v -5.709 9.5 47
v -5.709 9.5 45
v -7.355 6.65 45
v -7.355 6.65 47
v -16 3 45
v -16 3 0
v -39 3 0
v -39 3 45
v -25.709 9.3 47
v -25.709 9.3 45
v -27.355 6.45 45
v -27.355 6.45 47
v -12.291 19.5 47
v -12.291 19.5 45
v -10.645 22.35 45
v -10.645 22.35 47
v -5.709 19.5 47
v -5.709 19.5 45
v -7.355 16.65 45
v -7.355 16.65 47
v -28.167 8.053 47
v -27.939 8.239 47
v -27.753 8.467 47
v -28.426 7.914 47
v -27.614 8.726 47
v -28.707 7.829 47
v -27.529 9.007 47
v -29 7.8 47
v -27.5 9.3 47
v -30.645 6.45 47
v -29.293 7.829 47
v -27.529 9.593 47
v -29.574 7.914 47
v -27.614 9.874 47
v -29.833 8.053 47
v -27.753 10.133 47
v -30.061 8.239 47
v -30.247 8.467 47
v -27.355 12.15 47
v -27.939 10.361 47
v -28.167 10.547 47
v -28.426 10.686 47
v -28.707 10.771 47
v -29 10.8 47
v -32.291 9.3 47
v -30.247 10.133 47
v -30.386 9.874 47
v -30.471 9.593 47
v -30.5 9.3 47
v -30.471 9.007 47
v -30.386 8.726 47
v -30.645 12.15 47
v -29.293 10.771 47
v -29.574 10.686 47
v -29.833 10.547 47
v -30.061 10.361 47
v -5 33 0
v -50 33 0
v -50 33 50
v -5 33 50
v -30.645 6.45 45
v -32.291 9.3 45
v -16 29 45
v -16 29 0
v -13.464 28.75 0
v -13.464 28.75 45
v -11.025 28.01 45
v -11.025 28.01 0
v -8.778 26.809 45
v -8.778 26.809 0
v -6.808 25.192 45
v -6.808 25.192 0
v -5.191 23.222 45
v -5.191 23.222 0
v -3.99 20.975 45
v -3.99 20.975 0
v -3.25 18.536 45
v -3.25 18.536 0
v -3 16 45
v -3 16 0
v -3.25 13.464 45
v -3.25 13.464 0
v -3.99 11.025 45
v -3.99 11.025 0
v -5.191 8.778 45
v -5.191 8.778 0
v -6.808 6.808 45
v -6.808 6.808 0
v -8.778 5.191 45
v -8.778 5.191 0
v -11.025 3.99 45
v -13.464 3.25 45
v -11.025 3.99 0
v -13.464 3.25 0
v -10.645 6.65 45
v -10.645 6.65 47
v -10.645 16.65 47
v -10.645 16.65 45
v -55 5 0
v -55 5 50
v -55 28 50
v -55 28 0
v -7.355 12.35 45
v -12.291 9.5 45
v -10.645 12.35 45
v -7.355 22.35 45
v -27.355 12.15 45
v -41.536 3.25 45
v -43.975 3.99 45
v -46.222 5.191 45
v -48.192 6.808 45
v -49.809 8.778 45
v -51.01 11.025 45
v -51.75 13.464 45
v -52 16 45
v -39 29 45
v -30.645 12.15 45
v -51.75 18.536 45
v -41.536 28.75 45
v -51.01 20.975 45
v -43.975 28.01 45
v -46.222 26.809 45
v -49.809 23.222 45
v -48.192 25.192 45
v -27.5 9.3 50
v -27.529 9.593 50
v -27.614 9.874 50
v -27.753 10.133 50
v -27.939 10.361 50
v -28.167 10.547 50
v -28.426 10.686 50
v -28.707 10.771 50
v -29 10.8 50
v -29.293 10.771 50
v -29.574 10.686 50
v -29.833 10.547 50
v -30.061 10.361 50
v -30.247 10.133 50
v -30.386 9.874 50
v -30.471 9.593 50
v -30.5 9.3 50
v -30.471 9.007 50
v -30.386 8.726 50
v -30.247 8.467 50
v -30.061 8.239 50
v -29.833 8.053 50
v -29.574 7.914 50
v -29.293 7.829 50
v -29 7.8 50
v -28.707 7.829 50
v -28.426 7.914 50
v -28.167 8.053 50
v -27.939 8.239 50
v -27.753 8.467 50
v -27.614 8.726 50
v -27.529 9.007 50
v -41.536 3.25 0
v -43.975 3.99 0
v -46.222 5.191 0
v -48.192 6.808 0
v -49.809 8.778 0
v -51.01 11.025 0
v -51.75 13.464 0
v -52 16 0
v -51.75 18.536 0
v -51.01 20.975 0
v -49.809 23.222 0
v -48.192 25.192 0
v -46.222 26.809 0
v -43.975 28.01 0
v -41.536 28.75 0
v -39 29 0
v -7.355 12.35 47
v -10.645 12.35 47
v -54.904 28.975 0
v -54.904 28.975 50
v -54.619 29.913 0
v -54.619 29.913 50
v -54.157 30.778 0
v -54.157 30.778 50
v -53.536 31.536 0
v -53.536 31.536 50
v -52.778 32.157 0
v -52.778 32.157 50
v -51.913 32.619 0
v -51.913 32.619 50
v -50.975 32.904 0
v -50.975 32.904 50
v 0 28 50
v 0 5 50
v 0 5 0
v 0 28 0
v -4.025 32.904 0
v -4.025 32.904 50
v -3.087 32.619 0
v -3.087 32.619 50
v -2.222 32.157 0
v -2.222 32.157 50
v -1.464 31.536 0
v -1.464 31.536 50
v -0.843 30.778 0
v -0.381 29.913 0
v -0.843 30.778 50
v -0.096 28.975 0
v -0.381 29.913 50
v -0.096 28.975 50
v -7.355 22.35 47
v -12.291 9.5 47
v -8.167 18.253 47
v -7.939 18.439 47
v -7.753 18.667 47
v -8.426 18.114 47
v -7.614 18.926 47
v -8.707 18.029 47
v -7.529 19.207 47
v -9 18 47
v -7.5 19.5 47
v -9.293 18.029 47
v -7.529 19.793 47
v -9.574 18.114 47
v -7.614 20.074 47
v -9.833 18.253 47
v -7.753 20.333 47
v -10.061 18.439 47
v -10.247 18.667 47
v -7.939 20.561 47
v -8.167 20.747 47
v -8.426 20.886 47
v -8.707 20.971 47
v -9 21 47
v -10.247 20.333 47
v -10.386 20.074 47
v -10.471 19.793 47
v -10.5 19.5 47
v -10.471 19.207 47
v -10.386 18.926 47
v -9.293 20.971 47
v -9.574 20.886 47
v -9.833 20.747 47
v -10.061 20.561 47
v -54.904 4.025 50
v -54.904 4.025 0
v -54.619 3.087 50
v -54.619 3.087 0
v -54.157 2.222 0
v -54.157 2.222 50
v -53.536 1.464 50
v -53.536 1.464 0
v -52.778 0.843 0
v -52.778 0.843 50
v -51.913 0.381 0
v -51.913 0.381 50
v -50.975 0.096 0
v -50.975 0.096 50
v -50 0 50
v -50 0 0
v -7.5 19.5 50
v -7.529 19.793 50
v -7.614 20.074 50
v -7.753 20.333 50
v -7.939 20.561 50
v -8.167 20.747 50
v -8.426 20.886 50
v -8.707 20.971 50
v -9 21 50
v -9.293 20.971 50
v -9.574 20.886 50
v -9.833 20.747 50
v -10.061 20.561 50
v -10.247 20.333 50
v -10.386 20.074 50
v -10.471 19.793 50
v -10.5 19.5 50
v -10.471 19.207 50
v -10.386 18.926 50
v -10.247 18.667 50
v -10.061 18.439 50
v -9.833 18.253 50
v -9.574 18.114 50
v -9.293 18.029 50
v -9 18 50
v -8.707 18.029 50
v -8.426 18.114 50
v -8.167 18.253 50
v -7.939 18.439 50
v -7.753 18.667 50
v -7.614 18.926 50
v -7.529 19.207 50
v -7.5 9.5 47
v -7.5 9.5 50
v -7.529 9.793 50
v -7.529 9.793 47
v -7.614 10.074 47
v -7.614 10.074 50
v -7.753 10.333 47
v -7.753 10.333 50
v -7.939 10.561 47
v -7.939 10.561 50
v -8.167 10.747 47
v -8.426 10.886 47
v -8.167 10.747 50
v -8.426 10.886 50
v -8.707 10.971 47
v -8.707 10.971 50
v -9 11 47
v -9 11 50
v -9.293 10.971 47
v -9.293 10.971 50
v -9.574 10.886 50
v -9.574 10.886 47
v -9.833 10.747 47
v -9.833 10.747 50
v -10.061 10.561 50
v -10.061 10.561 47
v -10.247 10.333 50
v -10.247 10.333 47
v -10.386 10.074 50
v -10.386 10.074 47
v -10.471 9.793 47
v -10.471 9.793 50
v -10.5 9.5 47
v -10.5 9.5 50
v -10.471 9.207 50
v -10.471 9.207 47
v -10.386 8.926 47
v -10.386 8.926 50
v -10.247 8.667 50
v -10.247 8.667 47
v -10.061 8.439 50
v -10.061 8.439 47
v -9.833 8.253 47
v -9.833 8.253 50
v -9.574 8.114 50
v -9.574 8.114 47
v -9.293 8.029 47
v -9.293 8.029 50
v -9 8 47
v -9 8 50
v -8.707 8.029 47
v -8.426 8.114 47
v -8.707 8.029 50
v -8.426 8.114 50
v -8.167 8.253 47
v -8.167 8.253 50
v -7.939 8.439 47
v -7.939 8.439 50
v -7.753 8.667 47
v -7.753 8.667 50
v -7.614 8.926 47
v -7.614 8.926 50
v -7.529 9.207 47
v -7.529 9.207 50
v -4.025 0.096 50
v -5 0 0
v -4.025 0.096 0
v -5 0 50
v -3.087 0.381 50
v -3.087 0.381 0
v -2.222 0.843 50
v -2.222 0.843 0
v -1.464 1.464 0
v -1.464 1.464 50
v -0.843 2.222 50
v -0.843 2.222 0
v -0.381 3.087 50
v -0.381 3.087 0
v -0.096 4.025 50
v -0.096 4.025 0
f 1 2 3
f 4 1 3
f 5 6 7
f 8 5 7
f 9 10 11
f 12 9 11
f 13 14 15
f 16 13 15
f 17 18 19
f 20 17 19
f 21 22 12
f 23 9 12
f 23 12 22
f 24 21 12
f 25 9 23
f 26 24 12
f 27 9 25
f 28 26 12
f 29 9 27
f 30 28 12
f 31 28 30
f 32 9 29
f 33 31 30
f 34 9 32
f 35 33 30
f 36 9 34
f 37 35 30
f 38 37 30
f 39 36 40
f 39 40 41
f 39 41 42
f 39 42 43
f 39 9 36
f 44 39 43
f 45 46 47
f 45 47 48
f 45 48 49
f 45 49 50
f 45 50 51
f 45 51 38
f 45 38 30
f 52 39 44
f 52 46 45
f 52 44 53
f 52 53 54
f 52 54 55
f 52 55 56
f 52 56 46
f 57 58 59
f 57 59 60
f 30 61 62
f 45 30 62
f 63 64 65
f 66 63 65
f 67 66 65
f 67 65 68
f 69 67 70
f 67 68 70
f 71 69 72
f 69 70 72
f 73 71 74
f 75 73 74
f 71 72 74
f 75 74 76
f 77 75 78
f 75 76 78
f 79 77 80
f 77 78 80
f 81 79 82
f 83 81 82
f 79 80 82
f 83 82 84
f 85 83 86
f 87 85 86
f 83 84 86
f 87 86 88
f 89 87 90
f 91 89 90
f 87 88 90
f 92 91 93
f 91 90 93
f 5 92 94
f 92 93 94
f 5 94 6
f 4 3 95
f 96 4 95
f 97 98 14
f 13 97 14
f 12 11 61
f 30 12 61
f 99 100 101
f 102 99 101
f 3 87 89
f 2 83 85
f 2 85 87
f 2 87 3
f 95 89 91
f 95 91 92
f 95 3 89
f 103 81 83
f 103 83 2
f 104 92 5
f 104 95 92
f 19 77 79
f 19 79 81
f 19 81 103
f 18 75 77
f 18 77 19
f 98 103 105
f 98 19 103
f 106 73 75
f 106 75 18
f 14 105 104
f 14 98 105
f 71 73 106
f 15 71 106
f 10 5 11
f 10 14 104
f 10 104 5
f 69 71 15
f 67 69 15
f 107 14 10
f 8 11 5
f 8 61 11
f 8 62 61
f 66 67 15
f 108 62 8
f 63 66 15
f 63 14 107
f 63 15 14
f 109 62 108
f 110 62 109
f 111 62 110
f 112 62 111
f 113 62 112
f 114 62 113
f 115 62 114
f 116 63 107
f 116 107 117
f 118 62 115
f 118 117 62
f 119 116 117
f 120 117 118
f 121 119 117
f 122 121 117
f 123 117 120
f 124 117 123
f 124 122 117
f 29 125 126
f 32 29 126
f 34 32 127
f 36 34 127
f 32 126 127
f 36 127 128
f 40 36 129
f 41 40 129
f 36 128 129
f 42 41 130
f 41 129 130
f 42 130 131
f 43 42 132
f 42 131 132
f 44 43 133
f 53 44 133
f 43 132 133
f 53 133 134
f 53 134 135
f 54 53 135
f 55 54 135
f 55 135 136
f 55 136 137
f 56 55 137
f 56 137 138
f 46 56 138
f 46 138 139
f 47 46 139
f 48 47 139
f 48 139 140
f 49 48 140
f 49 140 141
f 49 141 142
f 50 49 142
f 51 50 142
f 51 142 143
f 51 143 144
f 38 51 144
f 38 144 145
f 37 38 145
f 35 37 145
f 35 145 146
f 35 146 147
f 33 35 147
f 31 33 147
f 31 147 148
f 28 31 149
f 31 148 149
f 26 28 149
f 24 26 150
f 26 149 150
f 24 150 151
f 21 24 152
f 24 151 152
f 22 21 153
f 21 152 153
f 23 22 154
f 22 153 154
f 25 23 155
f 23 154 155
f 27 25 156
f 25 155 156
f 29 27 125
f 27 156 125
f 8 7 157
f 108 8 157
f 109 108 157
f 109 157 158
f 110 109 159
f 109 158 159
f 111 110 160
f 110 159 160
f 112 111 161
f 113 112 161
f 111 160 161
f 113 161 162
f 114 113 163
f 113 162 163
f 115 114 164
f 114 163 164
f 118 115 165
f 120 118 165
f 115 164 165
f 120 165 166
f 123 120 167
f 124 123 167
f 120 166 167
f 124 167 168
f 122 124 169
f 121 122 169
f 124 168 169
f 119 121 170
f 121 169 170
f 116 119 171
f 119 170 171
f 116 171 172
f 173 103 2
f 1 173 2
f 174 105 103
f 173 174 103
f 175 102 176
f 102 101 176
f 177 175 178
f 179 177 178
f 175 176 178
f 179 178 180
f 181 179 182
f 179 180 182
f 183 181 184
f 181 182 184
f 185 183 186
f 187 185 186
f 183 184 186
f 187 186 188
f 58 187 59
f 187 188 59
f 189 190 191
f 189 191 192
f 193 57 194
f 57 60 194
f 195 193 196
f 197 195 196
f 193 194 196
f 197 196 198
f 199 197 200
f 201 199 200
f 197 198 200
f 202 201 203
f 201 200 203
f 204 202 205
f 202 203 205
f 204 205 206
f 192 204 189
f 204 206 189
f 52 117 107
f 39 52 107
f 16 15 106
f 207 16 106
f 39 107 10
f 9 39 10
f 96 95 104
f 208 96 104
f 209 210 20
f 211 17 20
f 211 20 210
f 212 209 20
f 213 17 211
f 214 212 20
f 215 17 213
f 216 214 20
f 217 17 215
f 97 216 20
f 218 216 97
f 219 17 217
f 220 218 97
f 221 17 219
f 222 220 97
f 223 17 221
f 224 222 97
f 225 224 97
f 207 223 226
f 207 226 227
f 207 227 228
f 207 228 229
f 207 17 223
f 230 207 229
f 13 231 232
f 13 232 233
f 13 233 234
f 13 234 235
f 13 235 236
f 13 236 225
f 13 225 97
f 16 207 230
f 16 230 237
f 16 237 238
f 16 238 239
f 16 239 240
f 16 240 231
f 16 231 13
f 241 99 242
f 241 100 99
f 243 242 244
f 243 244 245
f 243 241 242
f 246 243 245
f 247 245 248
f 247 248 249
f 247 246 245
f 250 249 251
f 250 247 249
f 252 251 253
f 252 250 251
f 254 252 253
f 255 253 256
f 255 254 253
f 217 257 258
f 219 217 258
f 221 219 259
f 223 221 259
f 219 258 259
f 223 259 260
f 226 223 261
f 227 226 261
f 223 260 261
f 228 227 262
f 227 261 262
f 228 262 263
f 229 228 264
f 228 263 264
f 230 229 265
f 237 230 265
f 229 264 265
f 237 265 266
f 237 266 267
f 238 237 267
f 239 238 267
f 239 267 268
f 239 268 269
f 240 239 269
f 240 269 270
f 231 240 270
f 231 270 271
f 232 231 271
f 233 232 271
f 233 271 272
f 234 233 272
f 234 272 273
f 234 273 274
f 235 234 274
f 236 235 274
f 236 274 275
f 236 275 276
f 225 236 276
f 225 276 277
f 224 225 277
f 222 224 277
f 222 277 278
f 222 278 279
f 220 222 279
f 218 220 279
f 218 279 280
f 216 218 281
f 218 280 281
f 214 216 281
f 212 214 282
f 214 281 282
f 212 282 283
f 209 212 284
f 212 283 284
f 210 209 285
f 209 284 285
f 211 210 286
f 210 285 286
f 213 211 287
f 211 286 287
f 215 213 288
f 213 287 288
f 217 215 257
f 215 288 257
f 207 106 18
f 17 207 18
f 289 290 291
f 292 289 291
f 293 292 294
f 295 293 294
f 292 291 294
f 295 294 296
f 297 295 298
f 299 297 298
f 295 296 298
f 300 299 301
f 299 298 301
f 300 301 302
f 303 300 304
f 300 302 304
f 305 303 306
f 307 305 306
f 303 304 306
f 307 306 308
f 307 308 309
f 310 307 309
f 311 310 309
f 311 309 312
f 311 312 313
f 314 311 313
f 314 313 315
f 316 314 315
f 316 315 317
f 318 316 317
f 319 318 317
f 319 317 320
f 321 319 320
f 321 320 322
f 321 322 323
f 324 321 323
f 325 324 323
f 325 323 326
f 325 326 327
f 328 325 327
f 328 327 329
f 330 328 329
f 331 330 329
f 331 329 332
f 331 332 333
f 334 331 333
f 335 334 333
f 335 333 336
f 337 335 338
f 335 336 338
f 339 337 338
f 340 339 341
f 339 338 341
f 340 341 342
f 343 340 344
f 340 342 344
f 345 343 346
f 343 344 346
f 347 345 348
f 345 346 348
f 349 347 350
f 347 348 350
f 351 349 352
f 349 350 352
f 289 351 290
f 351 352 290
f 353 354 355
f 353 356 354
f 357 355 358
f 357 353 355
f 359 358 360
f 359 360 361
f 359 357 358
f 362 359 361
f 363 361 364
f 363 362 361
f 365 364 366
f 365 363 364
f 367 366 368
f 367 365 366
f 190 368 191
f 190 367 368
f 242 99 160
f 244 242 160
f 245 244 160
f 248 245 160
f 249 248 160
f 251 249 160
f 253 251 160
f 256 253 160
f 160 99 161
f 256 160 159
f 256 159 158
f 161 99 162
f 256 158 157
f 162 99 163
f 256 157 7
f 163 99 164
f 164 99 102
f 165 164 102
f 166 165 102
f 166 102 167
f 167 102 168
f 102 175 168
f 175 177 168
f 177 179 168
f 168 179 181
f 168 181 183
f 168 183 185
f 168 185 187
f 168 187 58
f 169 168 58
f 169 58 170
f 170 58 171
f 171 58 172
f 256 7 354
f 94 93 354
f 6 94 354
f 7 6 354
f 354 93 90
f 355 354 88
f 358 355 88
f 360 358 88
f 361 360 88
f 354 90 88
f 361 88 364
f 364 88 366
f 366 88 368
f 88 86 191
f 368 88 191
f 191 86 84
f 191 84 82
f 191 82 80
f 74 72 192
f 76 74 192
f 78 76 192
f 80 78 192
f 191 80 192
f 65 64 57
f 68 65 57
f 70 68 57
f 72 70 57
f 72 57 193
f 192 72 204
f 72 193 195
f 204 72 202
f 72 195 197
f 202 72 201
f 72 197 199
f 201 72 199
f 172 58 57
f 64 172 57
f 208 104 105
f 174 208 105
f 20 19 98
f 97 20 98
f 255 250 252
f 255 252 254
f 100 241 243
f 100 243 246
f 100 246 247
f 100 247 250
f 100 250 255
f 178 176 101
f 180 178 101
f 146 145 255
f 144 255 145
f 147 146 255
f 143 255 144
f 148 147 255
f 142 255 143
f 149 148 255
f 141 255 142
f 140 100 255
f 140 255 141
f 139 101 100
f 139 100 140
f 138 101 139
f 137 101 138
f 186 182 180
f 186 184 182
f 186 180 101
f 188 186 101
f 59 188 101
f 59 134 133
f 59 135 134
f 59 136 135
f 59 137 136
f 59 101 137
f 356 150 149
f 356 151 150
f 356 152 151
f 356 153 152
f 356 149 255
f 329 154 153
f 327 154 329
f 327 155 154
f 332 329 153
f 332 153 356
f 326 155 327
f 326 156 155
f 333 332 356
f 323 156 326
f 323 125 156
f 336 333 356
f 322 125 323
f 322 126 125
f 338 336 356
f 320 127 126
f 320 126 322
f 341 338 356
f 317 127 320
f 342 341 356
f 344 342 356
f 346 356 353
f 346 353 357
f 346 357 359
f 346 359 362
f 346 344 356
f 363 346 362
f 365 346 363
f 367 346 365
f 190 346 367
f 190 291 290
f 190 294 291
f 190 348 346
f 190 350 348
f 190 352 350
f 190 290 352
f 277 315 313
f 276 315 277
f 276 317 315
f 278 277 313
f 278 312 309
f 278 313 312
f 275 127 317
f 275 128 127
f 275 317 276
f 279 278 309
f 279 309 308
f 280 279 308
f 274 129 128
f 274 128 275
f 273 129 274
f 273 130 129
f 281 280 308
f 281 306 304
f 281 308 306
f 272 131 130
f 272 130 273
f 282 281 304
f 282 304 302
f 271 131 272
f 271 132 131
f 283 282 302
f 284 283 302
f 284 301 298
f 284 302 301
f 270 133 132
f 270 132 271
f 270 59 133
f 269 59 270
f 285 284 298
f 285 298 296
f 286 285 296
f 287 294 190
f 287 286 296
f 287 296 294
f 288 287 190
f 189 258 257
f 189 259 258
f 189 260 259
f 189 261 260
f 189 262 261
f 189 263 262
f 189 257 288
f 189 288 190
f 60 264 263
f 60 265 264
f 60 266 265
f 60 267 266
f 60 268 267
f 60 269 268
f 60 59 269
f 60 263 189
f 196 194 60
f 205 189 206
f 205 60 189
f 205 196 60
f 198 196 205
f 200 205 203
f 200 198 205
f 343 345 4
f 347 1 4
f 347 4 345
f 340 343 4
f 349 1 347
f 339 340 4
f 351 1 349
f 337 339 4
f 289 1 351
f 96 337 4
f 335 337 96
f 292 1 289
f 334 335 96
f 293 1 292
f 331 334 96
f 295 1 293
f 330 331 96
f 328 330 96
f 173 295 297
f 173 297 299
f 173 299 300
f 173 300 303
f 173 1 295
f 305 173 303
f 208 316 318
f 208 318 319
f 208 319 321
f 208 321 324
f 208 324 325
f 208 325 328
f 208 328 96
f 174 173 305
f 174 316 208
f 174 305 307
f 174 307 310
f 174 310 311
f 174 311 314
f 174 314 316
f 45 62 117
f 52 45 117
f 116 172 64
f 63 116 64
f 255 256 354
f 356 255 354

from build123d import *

# Parameters (mm, degrees)
ESQUISSE1_W             = 55
ESQUISSE1_H             = 33
BOSS_EXTRU_1_DEPTH      = 50
ENL_V_MAT_EXTRU_2_DEPTH = 45
CONG_1_R                = 5
ESQUISSE3_R             = 1.5
ENL_V_MAT_EXTRU_3_DEPTH = 10
ENL_V_MAT_EXTRU_4_DEPTH = 2


with BuildPart() as part:
    # Esquisse1 → Boss.-Extru.1 (new body)
    with BuildSketch(Plane.XY):
        with Locations((-27.5, 16.5)):
            Rectangle(ESQUISSE1_W, ESQUISSE1_H)
    extrude(amount=BOSS_EXTRU_1_DEPTH)

    # Esquisse2 → Enlèv. mat.-Extru.2 (cut)
    with BuildSketch(Plane.XY):
        with BuildLine():
            Line((-39, 29), (-16, 29))
            ThreePointArc((-16, 29), (-3, 16), (-16, 3))
            Line((-16, 3), (-39, 3))
            ThreePointArc((-39, 3), (-52, 16), (-39, 29))
        make_face()
    extrude(amount=ENL_V_MAT_EXTRU_2_DEPTH, mode=Mode.SUBTRACT)

    # Congé1
    cong_1_edges = [part.edges().sort_by_distance(p)[0] for p in [
        (0, 0, 25),
        (-55, 0, 25),
        (-55, 33, 25),
        (0, 33, 25),
    ]]
    fillet(cong_1_edges, radius=CONG_1_R)

    # Esquisse3 → Enlèv. mat.-Extru.3 (cut)
    with BuildSketch(Plane.XY.offset(50)):
        with Locations((-29, 9.3)):
            Circle(ESQUISSE3_R)
        with Locations((-9, 19.5)):
            Circle(ESQUISSE3_R)
        with Locations((-9, 9.5)):
            Circle(ESQUISSE3_R)
    extrude(amount=-ENL_V_MAT_EXTRU_3_DEPTH, mode=Mode.SUBTRACT)

    # Esquisse4 → Enlèv. mat.-Extru.4 (cut)
    with BuildSketch(Plane(origin=(0, 0, 45), x_dir=(-1, 0, 0), z_dir=(0, 0, -1))):
        Polygon((27.354551733, 6.45), (30.645448267, 6.45), (32.290896534, 9.3), (30.645448267, 12.15), (27.354551733, 12.15), (25.709103466, 9.3), align=None)
        Polygon((7.354551733, 6.65), (10.645448267, 6.65), (12.290896534, 9.5), (10.645448267, 12.35), (7.354551733, 12.35), (5.709103466, 9.5), align=None)
        Polygon((7.354551733, 16.65), (10.645448267, 16.65), (12.290896534, 19.5), (10.645448267, 22.35), (7.354551733, 22.35), (5.709103466, 19.5), align=None)
    extrude(amount=-ENL_V_MAT_EXTRU_4_DEPTH, mode=Mode.SUBTRACT)


solid = part.part
